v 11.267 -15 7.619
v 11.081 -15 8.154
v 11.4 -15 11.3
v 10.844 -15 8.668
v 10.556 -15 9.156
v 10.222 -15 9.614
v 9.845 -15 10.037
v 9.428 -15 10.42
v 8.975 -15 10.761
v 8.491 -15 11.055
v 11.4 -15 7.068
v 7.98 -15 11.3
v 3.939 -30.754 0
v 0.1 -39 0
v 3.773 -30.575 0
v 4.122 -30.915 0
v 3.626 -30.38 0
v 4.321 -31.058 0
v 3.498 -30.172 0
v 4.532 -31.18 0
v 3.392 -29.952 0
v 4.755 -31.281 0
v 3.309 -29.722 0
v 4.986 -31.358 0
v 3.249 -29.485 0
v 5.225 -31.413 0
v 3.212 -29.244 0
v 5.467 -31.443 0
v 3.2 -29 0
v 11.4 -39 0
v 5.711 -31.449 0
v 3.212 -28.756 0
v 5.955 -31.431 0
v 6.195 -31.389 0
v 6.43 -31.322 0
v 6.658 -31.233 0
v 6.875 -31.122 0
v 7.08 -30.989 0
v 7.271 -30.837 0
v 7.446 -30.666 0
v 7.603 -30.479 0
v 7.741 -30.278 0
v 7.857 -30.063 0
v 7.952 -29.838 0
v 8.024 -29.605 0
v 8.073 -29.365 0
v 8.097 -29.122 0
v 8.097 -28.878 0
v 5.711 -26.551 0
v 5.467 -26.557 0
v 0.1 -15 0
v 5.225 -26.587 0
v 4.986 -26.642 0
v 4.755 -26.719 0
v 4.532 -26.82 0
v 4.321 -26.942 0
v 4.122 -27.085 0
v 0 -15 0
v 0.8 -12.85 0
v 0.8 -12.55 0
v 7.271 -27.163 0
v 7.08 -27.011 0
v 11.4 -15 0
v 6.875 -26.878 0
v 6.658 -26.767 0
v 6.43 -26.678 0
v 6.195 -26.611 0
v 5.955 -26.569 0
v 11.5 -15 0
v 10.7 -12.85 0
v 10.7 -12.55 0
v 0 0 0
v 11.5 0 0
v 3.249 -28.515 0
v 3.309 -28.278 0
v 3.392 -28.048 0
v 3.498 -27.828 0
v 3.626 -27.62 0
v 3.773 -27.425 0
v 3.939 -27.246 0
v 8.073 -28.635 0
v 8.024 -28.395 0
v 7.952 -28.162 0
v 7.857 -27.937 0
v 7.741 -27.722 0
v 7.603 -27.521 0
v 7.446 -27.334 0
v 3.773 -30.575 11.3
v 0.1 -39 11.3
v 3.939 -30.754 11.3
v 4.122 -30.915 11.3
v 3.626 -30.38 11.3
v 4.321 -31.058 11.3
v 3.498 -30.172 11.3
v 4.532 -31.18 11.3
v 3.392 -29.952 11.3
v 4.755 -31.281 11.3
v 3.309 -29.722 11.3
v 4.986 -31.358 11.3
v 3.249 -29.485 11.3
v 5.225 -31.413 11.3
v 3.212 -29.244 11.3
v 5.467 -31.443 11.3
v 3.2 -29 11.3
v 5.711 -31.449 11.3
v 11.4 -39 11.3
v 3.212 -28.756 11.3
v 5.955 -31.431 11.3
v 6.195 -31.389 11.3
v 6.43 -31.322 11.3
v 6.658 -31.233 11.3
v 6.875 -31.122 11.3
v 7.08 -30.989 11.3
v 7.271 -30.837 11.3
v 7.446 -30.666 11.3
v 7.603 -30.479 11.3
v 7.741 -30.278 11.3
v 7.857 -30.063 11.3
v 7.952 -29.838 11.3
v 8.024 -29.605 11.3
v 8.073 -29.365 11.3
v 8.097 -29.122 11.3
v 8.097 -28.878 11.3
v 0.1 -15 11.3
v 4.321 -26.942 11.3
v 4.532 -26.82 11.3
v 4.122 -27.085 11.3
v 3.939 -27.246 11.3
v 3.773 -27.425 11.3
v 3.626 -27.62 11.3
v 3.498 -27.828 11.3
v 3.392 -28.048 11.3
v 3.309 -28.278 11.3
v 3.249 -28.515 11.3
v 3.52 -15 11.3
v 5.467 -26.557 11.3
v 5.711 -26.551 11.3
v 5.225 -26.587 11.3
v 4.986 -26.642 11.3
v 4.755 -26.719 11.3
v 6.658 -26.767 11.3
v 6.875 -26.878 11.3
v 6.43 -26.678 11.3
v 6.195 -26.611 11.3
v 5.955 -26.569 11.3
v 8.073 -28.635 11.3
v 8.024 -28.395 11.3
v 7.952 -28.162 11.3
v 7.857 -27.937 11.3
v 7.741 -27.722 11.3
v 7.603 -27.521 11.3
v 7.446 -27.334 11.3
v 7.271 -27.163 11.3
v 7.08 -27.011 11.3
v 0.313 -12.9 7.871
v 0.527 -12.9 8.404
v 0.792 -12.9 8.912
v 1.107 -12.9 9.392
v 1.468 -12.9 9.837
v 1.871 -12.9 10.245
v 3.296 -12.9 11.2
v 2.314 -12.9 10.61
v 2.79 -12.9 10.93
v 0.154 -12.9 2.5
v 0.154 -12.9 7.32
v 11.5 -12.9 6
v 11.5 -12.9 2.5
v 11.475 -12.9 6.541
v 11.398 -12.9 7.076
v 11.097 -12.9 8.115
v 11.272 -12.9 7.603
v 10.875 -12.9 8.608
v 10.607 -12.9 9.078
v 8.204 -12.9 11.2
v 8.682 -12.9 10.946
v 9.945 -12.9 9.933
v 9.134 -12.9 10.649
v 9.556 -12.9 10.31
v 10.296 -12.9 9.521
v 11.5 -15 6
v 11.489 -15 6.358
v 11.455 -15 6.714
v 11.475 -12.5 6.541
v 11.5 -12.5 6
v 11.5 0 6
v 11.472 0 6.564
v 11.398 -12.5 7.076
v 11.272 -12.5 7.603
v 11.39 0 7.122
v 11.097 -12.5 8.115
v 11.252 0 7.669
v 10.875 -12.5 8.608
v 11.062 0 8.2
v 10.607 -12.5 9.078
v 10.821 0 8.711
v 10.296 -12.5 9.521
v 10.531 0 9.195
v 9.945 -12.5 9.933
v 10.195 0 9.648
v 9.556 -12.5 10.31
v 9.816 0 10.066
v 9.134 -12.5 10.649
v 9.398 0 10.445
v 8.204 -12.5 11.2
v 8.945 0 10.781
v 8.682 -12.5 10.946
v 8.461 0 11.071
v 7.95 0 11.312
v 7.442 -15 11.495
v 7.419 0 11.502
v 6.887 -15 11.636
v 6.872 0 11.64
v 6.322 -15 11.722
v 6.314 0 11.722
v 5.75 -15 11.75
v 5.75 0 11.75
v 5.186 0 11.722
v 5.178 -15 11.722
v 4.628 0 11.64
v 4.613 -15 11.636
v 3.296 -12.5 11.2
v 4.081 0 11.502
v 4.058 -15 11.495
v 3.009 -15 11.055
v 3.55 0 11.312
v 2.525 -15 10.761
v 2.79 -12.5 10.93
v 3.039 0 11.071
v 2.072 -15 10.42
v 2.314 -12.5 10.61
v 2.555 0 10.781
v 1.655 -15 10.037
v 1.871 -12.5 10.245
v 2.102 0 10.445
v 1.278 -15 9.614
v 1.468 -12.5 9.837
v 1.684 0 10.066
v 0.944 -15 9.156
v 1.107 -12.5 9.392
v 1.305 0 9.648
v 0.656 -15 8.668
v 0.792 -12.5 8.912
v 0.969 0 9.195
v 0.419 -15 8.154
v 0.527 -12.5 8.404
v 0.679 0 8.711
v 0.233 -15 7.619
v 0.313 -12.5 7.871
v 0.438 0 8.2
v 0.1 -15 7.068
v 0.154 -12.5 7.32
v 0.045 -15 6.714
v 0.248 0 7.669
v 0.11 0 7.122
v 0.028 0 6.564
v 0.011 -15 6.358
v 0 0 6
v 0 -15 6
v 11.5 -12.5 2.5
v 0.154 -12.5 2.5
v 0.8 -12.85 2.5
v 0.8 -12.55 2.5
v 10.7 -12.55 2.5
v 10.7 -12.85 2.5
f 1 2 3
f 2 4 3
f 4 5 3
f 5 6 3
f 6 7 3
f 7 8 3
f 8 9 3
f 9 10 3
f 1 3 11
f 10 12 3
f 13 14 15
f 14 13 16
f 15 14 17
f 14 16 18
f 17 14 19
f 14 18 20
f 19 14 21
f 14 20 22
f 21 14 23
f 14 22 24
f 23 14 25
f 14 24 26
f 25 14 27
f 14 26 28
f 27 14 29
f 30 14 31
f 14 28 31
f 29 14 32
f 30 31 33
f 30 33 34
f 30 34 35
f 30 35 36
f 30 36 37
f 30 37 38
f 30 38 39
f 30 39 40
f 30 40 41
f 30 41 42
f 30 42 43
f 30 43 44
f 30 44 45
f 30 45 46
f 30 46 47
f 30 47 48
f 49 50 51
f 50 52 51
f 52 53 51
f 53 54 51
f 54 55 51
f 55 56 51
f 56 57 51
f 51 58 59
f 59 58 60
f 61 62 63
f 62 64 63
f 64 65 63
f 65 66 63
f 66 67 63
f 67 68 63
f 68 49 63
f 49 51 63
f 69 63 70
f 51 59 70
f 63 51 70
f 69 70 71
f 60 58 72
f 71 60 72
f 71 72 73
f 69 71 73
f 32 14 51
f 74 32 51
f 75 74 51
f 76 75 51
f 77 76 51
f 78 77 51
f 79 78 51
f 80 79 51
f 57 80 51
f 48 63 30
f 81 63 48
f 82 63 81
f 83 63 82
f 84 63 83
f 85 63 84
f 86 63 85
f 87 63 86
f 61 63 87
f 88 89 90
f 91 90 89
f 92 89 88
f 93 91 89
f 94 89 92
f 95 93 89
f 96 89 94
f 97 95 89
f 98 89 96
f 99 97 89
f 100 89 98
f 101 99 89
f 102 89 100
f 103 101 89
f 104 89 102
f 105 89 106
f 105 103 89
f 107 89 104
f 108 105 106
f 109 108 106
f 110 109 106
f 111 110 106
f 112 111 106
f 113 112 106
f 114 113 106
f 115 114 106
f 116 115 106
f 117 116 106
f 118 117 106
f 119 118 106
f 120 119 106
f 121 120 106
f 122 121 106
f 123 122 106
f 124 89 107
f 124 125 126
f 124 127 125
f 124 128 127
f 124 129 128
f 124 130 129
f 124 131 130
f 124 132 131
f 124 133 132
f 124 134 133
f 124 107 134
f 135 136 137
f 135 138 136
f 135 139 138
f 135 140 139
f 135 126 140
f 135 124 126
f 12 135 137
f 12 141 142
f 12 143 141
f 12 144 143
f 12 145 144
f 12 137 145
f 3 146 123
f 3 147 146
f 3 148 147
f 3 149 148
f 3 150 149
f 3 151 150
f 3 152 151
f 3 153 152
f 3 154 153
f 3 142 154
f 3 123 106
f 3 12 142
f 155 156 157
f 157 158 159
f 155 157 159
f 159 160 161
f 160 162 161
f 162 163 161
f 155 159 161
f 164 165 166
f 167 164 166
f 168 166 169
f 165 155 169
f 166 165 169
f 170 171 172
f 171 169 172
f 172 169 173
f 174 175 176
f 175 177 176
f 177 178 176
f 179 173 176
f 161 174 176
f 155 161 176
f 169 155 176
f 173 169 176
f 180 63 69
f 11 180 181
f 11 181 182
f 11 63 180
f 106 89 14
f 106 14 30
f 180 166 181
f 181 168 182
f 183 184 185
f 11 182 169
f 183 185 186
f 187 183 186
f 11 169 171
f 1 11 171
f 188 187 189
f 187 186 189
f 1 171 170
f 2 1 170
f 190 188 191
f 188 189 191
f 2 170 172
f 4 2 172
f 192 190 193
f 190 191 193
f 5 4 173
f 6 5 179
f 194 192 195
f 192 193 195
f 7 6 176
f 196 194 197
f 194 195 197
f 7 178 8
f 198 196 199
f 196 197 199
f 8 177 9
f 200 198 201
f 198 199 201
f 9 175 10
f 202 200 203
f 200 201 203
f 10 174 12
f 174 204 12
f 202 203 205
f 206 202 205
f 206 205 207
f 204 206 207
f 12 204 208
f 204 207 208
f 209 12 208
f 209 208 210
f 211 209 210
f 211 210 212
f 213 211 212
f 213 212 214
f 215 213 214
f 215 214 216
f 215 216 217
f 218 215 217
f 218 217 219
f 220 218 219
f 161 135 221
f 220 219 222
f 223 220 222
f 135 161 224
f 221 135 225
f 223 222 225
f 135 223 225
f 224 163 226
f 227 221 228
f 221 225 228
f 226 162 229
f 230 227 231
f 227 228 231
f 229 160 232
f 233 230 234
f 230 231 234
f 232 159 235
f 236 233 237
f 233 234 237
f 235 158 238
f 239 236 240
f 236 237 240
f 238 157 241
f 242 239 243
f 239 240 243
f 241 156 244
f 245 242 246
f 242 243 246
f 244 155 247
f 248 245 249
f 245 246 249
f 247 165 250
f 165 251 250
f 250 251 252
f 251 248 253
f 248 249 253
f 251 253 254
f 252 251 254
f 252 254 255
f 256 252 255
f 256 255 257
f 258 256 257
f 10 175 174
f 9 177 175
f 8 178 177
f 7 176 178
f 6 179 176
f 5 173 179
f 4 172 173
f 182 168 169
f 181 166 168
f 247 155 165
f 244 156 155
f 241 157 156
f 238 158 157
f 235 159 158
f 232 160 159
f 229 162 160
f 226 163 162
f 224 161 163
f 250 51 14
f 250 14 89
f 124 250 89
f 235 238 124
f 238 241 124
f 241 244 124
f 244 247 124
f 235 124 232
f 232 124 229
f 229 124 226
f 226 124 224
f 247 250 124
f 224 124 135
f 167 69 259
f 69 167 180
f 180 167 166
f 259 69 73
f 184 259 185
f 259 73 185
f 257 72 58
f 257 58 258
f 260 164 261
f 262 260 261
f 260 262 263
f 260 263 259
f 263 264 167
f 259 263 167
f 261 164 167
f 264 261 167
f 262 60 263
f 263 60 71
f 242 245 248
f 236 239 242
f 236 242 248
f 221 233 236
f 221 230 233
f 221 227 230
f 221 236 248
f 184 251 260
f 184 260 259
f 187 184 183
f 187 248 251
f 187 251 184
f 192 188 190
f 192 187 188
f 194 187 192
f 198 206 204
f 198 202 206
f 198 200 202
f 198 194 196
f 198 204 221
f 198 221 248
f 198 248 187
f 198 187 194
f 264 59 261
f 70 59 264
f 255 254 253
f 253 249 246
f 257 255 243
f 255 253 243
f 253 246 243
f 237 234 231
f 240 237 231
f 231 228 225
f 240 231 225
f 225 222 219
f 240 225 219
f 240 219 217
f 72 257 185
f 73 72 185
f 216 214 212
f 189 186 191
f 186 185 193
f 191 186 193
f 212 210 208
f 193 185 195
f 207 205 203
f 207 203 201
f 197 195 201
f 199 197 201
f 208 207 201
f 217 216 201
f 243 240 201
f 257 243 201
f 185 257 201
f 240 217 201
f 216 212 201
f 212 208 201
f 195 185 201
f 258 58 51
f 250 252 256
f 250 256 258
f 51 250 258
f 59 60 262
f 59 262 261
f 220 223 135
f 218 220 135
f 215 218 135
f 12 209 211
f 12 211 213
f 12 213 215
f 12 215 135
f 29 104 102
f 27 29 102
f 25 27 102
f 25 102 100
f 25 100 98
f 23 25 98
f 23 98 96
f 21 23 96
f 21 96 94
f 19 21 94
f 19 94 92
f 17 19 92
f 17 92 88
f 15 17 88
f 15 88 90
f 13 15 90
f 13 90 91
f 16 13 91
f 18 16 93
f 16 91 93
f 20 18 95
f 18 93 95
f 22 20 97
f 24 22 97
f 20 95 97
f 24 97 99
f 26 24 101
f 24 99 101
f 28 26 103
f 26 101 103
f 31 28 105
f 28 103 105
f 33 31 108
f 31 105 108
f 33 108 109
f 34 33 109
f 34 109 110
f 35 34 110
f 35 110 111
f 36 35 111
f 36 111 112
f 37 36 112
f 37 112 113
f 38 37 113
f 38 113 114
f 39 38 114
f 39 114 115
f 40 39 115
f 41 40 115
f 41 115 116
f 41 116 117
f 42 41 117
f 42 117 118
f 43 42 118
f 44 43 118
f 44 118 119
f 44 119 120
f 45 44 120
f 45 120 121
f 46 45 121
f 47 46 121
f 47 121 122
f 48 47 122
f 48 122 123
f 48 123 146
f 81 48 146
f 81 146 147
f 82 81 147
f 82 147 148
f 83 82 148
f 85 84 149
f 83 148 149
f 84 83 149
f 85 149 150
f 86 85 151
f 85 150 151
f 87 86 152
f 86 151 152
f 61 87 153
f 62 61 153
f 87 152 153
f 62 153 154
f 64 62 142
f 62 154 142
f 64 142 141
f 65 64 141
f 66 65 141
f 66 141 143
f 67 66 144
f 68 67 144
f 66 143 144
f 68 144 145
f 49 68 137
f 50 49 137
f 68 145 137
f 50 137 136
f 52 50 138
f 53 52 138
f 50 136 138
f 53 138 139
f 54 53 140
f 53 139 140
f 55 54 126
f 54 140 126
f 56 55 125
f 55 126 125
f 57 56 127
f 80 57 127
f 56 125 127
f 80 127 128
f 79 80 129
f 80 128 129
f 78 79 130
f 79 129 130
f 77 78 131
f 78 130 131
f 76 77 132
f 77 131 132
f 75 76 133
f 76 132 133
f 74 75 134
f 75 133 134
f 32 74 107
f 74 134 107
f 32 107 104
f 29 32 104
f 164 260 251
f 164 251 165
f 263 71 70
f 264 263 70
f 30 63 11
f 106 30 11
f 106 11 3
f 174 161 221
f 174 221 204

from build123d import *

# Parameters (mm, degrees)
F0_W      = 11.5
F0_H      = 6
F1_DEPTH  = 15
F2_W      = 11.3
F2_H      = 11.3
F3_DEPTH  = 24
F5_W      = 12.6701932168
F5_H      = 0.4
F6_DEPTH  = 5.2
F7_W      = 9.9
F7_H      = 0.3
F8_DEPTH  = 6
F9_D      = 4.9
F10_DEPTH = 3.5


with BuildPart() as f1:
    # F0 (on Front) → F1 (new body)
    with BuildSketch(Plane.XZ):
        with BuildLine():
            ThreePointArc((11.5, 6), (5.75, 11.75), (0, 6))
            Line((0, 6), (11.5, 6))
        make_face()
        with Locations((5.75, 3)):
            Rectangle(F0_W, F0_H)
    extrude(amount=F1_DEPTH)

    # F2 (on face) → F3 (join)
    with BuildSketch(Plane.XZ.offset(15)):
        with Locations((5.75, 5.65)):
            Rectangle(F2_W, F2_H)
    extrude(amount=F3_DEPTH)

    # F5 (on 3pt) → F6 (cut)
    with BuildSketch(Plane(origin=(0, 0, 6), x_dir=(1, 0, 0), z_dir=(0, 0, -1))):
        with Locations((6.4887672779, 12.7)):
            Rectangle(F5_W, F5_H)
    extrude(amount=-F6_DEPTH, mode=Mode.SUBTRACT)

    # F7 (on face) → F8 (cut, through all)
    with BuildSketch(Plane(origin=(0, 0, 0), x_dir=(1, 0, 0), z_dir=(0, 0, -1))):
        with Locations((5.75, 12.7)):
            Rectangle(F7_W, F7_H)
    extrude(amount=-F8_DEPTH, mode=Mode.SUBTRACT)

    # F9 (through all)
    with Locations(Plane(origin=(0, 0, 0), x_dir=(1, 0, 0), z_dir=(0, 0, -1))):
        with Locations((5.65, 29)):
            Hole(F9_D / 2)

    # F5 (on 3pt) → F10 (cut)
    with BuildSketch(Plane(origin=(0, 0, 6), x_dir=(1, 0, 0), z_dir=(0, 0, -1))):
        with Locations((6.4887672779, 12.7)):
            Rectangle(F5_W, F5_H)
    extrude(amount=F10_DEPTH, mode=Mode.SUBTRACT)


solid = f1.part
